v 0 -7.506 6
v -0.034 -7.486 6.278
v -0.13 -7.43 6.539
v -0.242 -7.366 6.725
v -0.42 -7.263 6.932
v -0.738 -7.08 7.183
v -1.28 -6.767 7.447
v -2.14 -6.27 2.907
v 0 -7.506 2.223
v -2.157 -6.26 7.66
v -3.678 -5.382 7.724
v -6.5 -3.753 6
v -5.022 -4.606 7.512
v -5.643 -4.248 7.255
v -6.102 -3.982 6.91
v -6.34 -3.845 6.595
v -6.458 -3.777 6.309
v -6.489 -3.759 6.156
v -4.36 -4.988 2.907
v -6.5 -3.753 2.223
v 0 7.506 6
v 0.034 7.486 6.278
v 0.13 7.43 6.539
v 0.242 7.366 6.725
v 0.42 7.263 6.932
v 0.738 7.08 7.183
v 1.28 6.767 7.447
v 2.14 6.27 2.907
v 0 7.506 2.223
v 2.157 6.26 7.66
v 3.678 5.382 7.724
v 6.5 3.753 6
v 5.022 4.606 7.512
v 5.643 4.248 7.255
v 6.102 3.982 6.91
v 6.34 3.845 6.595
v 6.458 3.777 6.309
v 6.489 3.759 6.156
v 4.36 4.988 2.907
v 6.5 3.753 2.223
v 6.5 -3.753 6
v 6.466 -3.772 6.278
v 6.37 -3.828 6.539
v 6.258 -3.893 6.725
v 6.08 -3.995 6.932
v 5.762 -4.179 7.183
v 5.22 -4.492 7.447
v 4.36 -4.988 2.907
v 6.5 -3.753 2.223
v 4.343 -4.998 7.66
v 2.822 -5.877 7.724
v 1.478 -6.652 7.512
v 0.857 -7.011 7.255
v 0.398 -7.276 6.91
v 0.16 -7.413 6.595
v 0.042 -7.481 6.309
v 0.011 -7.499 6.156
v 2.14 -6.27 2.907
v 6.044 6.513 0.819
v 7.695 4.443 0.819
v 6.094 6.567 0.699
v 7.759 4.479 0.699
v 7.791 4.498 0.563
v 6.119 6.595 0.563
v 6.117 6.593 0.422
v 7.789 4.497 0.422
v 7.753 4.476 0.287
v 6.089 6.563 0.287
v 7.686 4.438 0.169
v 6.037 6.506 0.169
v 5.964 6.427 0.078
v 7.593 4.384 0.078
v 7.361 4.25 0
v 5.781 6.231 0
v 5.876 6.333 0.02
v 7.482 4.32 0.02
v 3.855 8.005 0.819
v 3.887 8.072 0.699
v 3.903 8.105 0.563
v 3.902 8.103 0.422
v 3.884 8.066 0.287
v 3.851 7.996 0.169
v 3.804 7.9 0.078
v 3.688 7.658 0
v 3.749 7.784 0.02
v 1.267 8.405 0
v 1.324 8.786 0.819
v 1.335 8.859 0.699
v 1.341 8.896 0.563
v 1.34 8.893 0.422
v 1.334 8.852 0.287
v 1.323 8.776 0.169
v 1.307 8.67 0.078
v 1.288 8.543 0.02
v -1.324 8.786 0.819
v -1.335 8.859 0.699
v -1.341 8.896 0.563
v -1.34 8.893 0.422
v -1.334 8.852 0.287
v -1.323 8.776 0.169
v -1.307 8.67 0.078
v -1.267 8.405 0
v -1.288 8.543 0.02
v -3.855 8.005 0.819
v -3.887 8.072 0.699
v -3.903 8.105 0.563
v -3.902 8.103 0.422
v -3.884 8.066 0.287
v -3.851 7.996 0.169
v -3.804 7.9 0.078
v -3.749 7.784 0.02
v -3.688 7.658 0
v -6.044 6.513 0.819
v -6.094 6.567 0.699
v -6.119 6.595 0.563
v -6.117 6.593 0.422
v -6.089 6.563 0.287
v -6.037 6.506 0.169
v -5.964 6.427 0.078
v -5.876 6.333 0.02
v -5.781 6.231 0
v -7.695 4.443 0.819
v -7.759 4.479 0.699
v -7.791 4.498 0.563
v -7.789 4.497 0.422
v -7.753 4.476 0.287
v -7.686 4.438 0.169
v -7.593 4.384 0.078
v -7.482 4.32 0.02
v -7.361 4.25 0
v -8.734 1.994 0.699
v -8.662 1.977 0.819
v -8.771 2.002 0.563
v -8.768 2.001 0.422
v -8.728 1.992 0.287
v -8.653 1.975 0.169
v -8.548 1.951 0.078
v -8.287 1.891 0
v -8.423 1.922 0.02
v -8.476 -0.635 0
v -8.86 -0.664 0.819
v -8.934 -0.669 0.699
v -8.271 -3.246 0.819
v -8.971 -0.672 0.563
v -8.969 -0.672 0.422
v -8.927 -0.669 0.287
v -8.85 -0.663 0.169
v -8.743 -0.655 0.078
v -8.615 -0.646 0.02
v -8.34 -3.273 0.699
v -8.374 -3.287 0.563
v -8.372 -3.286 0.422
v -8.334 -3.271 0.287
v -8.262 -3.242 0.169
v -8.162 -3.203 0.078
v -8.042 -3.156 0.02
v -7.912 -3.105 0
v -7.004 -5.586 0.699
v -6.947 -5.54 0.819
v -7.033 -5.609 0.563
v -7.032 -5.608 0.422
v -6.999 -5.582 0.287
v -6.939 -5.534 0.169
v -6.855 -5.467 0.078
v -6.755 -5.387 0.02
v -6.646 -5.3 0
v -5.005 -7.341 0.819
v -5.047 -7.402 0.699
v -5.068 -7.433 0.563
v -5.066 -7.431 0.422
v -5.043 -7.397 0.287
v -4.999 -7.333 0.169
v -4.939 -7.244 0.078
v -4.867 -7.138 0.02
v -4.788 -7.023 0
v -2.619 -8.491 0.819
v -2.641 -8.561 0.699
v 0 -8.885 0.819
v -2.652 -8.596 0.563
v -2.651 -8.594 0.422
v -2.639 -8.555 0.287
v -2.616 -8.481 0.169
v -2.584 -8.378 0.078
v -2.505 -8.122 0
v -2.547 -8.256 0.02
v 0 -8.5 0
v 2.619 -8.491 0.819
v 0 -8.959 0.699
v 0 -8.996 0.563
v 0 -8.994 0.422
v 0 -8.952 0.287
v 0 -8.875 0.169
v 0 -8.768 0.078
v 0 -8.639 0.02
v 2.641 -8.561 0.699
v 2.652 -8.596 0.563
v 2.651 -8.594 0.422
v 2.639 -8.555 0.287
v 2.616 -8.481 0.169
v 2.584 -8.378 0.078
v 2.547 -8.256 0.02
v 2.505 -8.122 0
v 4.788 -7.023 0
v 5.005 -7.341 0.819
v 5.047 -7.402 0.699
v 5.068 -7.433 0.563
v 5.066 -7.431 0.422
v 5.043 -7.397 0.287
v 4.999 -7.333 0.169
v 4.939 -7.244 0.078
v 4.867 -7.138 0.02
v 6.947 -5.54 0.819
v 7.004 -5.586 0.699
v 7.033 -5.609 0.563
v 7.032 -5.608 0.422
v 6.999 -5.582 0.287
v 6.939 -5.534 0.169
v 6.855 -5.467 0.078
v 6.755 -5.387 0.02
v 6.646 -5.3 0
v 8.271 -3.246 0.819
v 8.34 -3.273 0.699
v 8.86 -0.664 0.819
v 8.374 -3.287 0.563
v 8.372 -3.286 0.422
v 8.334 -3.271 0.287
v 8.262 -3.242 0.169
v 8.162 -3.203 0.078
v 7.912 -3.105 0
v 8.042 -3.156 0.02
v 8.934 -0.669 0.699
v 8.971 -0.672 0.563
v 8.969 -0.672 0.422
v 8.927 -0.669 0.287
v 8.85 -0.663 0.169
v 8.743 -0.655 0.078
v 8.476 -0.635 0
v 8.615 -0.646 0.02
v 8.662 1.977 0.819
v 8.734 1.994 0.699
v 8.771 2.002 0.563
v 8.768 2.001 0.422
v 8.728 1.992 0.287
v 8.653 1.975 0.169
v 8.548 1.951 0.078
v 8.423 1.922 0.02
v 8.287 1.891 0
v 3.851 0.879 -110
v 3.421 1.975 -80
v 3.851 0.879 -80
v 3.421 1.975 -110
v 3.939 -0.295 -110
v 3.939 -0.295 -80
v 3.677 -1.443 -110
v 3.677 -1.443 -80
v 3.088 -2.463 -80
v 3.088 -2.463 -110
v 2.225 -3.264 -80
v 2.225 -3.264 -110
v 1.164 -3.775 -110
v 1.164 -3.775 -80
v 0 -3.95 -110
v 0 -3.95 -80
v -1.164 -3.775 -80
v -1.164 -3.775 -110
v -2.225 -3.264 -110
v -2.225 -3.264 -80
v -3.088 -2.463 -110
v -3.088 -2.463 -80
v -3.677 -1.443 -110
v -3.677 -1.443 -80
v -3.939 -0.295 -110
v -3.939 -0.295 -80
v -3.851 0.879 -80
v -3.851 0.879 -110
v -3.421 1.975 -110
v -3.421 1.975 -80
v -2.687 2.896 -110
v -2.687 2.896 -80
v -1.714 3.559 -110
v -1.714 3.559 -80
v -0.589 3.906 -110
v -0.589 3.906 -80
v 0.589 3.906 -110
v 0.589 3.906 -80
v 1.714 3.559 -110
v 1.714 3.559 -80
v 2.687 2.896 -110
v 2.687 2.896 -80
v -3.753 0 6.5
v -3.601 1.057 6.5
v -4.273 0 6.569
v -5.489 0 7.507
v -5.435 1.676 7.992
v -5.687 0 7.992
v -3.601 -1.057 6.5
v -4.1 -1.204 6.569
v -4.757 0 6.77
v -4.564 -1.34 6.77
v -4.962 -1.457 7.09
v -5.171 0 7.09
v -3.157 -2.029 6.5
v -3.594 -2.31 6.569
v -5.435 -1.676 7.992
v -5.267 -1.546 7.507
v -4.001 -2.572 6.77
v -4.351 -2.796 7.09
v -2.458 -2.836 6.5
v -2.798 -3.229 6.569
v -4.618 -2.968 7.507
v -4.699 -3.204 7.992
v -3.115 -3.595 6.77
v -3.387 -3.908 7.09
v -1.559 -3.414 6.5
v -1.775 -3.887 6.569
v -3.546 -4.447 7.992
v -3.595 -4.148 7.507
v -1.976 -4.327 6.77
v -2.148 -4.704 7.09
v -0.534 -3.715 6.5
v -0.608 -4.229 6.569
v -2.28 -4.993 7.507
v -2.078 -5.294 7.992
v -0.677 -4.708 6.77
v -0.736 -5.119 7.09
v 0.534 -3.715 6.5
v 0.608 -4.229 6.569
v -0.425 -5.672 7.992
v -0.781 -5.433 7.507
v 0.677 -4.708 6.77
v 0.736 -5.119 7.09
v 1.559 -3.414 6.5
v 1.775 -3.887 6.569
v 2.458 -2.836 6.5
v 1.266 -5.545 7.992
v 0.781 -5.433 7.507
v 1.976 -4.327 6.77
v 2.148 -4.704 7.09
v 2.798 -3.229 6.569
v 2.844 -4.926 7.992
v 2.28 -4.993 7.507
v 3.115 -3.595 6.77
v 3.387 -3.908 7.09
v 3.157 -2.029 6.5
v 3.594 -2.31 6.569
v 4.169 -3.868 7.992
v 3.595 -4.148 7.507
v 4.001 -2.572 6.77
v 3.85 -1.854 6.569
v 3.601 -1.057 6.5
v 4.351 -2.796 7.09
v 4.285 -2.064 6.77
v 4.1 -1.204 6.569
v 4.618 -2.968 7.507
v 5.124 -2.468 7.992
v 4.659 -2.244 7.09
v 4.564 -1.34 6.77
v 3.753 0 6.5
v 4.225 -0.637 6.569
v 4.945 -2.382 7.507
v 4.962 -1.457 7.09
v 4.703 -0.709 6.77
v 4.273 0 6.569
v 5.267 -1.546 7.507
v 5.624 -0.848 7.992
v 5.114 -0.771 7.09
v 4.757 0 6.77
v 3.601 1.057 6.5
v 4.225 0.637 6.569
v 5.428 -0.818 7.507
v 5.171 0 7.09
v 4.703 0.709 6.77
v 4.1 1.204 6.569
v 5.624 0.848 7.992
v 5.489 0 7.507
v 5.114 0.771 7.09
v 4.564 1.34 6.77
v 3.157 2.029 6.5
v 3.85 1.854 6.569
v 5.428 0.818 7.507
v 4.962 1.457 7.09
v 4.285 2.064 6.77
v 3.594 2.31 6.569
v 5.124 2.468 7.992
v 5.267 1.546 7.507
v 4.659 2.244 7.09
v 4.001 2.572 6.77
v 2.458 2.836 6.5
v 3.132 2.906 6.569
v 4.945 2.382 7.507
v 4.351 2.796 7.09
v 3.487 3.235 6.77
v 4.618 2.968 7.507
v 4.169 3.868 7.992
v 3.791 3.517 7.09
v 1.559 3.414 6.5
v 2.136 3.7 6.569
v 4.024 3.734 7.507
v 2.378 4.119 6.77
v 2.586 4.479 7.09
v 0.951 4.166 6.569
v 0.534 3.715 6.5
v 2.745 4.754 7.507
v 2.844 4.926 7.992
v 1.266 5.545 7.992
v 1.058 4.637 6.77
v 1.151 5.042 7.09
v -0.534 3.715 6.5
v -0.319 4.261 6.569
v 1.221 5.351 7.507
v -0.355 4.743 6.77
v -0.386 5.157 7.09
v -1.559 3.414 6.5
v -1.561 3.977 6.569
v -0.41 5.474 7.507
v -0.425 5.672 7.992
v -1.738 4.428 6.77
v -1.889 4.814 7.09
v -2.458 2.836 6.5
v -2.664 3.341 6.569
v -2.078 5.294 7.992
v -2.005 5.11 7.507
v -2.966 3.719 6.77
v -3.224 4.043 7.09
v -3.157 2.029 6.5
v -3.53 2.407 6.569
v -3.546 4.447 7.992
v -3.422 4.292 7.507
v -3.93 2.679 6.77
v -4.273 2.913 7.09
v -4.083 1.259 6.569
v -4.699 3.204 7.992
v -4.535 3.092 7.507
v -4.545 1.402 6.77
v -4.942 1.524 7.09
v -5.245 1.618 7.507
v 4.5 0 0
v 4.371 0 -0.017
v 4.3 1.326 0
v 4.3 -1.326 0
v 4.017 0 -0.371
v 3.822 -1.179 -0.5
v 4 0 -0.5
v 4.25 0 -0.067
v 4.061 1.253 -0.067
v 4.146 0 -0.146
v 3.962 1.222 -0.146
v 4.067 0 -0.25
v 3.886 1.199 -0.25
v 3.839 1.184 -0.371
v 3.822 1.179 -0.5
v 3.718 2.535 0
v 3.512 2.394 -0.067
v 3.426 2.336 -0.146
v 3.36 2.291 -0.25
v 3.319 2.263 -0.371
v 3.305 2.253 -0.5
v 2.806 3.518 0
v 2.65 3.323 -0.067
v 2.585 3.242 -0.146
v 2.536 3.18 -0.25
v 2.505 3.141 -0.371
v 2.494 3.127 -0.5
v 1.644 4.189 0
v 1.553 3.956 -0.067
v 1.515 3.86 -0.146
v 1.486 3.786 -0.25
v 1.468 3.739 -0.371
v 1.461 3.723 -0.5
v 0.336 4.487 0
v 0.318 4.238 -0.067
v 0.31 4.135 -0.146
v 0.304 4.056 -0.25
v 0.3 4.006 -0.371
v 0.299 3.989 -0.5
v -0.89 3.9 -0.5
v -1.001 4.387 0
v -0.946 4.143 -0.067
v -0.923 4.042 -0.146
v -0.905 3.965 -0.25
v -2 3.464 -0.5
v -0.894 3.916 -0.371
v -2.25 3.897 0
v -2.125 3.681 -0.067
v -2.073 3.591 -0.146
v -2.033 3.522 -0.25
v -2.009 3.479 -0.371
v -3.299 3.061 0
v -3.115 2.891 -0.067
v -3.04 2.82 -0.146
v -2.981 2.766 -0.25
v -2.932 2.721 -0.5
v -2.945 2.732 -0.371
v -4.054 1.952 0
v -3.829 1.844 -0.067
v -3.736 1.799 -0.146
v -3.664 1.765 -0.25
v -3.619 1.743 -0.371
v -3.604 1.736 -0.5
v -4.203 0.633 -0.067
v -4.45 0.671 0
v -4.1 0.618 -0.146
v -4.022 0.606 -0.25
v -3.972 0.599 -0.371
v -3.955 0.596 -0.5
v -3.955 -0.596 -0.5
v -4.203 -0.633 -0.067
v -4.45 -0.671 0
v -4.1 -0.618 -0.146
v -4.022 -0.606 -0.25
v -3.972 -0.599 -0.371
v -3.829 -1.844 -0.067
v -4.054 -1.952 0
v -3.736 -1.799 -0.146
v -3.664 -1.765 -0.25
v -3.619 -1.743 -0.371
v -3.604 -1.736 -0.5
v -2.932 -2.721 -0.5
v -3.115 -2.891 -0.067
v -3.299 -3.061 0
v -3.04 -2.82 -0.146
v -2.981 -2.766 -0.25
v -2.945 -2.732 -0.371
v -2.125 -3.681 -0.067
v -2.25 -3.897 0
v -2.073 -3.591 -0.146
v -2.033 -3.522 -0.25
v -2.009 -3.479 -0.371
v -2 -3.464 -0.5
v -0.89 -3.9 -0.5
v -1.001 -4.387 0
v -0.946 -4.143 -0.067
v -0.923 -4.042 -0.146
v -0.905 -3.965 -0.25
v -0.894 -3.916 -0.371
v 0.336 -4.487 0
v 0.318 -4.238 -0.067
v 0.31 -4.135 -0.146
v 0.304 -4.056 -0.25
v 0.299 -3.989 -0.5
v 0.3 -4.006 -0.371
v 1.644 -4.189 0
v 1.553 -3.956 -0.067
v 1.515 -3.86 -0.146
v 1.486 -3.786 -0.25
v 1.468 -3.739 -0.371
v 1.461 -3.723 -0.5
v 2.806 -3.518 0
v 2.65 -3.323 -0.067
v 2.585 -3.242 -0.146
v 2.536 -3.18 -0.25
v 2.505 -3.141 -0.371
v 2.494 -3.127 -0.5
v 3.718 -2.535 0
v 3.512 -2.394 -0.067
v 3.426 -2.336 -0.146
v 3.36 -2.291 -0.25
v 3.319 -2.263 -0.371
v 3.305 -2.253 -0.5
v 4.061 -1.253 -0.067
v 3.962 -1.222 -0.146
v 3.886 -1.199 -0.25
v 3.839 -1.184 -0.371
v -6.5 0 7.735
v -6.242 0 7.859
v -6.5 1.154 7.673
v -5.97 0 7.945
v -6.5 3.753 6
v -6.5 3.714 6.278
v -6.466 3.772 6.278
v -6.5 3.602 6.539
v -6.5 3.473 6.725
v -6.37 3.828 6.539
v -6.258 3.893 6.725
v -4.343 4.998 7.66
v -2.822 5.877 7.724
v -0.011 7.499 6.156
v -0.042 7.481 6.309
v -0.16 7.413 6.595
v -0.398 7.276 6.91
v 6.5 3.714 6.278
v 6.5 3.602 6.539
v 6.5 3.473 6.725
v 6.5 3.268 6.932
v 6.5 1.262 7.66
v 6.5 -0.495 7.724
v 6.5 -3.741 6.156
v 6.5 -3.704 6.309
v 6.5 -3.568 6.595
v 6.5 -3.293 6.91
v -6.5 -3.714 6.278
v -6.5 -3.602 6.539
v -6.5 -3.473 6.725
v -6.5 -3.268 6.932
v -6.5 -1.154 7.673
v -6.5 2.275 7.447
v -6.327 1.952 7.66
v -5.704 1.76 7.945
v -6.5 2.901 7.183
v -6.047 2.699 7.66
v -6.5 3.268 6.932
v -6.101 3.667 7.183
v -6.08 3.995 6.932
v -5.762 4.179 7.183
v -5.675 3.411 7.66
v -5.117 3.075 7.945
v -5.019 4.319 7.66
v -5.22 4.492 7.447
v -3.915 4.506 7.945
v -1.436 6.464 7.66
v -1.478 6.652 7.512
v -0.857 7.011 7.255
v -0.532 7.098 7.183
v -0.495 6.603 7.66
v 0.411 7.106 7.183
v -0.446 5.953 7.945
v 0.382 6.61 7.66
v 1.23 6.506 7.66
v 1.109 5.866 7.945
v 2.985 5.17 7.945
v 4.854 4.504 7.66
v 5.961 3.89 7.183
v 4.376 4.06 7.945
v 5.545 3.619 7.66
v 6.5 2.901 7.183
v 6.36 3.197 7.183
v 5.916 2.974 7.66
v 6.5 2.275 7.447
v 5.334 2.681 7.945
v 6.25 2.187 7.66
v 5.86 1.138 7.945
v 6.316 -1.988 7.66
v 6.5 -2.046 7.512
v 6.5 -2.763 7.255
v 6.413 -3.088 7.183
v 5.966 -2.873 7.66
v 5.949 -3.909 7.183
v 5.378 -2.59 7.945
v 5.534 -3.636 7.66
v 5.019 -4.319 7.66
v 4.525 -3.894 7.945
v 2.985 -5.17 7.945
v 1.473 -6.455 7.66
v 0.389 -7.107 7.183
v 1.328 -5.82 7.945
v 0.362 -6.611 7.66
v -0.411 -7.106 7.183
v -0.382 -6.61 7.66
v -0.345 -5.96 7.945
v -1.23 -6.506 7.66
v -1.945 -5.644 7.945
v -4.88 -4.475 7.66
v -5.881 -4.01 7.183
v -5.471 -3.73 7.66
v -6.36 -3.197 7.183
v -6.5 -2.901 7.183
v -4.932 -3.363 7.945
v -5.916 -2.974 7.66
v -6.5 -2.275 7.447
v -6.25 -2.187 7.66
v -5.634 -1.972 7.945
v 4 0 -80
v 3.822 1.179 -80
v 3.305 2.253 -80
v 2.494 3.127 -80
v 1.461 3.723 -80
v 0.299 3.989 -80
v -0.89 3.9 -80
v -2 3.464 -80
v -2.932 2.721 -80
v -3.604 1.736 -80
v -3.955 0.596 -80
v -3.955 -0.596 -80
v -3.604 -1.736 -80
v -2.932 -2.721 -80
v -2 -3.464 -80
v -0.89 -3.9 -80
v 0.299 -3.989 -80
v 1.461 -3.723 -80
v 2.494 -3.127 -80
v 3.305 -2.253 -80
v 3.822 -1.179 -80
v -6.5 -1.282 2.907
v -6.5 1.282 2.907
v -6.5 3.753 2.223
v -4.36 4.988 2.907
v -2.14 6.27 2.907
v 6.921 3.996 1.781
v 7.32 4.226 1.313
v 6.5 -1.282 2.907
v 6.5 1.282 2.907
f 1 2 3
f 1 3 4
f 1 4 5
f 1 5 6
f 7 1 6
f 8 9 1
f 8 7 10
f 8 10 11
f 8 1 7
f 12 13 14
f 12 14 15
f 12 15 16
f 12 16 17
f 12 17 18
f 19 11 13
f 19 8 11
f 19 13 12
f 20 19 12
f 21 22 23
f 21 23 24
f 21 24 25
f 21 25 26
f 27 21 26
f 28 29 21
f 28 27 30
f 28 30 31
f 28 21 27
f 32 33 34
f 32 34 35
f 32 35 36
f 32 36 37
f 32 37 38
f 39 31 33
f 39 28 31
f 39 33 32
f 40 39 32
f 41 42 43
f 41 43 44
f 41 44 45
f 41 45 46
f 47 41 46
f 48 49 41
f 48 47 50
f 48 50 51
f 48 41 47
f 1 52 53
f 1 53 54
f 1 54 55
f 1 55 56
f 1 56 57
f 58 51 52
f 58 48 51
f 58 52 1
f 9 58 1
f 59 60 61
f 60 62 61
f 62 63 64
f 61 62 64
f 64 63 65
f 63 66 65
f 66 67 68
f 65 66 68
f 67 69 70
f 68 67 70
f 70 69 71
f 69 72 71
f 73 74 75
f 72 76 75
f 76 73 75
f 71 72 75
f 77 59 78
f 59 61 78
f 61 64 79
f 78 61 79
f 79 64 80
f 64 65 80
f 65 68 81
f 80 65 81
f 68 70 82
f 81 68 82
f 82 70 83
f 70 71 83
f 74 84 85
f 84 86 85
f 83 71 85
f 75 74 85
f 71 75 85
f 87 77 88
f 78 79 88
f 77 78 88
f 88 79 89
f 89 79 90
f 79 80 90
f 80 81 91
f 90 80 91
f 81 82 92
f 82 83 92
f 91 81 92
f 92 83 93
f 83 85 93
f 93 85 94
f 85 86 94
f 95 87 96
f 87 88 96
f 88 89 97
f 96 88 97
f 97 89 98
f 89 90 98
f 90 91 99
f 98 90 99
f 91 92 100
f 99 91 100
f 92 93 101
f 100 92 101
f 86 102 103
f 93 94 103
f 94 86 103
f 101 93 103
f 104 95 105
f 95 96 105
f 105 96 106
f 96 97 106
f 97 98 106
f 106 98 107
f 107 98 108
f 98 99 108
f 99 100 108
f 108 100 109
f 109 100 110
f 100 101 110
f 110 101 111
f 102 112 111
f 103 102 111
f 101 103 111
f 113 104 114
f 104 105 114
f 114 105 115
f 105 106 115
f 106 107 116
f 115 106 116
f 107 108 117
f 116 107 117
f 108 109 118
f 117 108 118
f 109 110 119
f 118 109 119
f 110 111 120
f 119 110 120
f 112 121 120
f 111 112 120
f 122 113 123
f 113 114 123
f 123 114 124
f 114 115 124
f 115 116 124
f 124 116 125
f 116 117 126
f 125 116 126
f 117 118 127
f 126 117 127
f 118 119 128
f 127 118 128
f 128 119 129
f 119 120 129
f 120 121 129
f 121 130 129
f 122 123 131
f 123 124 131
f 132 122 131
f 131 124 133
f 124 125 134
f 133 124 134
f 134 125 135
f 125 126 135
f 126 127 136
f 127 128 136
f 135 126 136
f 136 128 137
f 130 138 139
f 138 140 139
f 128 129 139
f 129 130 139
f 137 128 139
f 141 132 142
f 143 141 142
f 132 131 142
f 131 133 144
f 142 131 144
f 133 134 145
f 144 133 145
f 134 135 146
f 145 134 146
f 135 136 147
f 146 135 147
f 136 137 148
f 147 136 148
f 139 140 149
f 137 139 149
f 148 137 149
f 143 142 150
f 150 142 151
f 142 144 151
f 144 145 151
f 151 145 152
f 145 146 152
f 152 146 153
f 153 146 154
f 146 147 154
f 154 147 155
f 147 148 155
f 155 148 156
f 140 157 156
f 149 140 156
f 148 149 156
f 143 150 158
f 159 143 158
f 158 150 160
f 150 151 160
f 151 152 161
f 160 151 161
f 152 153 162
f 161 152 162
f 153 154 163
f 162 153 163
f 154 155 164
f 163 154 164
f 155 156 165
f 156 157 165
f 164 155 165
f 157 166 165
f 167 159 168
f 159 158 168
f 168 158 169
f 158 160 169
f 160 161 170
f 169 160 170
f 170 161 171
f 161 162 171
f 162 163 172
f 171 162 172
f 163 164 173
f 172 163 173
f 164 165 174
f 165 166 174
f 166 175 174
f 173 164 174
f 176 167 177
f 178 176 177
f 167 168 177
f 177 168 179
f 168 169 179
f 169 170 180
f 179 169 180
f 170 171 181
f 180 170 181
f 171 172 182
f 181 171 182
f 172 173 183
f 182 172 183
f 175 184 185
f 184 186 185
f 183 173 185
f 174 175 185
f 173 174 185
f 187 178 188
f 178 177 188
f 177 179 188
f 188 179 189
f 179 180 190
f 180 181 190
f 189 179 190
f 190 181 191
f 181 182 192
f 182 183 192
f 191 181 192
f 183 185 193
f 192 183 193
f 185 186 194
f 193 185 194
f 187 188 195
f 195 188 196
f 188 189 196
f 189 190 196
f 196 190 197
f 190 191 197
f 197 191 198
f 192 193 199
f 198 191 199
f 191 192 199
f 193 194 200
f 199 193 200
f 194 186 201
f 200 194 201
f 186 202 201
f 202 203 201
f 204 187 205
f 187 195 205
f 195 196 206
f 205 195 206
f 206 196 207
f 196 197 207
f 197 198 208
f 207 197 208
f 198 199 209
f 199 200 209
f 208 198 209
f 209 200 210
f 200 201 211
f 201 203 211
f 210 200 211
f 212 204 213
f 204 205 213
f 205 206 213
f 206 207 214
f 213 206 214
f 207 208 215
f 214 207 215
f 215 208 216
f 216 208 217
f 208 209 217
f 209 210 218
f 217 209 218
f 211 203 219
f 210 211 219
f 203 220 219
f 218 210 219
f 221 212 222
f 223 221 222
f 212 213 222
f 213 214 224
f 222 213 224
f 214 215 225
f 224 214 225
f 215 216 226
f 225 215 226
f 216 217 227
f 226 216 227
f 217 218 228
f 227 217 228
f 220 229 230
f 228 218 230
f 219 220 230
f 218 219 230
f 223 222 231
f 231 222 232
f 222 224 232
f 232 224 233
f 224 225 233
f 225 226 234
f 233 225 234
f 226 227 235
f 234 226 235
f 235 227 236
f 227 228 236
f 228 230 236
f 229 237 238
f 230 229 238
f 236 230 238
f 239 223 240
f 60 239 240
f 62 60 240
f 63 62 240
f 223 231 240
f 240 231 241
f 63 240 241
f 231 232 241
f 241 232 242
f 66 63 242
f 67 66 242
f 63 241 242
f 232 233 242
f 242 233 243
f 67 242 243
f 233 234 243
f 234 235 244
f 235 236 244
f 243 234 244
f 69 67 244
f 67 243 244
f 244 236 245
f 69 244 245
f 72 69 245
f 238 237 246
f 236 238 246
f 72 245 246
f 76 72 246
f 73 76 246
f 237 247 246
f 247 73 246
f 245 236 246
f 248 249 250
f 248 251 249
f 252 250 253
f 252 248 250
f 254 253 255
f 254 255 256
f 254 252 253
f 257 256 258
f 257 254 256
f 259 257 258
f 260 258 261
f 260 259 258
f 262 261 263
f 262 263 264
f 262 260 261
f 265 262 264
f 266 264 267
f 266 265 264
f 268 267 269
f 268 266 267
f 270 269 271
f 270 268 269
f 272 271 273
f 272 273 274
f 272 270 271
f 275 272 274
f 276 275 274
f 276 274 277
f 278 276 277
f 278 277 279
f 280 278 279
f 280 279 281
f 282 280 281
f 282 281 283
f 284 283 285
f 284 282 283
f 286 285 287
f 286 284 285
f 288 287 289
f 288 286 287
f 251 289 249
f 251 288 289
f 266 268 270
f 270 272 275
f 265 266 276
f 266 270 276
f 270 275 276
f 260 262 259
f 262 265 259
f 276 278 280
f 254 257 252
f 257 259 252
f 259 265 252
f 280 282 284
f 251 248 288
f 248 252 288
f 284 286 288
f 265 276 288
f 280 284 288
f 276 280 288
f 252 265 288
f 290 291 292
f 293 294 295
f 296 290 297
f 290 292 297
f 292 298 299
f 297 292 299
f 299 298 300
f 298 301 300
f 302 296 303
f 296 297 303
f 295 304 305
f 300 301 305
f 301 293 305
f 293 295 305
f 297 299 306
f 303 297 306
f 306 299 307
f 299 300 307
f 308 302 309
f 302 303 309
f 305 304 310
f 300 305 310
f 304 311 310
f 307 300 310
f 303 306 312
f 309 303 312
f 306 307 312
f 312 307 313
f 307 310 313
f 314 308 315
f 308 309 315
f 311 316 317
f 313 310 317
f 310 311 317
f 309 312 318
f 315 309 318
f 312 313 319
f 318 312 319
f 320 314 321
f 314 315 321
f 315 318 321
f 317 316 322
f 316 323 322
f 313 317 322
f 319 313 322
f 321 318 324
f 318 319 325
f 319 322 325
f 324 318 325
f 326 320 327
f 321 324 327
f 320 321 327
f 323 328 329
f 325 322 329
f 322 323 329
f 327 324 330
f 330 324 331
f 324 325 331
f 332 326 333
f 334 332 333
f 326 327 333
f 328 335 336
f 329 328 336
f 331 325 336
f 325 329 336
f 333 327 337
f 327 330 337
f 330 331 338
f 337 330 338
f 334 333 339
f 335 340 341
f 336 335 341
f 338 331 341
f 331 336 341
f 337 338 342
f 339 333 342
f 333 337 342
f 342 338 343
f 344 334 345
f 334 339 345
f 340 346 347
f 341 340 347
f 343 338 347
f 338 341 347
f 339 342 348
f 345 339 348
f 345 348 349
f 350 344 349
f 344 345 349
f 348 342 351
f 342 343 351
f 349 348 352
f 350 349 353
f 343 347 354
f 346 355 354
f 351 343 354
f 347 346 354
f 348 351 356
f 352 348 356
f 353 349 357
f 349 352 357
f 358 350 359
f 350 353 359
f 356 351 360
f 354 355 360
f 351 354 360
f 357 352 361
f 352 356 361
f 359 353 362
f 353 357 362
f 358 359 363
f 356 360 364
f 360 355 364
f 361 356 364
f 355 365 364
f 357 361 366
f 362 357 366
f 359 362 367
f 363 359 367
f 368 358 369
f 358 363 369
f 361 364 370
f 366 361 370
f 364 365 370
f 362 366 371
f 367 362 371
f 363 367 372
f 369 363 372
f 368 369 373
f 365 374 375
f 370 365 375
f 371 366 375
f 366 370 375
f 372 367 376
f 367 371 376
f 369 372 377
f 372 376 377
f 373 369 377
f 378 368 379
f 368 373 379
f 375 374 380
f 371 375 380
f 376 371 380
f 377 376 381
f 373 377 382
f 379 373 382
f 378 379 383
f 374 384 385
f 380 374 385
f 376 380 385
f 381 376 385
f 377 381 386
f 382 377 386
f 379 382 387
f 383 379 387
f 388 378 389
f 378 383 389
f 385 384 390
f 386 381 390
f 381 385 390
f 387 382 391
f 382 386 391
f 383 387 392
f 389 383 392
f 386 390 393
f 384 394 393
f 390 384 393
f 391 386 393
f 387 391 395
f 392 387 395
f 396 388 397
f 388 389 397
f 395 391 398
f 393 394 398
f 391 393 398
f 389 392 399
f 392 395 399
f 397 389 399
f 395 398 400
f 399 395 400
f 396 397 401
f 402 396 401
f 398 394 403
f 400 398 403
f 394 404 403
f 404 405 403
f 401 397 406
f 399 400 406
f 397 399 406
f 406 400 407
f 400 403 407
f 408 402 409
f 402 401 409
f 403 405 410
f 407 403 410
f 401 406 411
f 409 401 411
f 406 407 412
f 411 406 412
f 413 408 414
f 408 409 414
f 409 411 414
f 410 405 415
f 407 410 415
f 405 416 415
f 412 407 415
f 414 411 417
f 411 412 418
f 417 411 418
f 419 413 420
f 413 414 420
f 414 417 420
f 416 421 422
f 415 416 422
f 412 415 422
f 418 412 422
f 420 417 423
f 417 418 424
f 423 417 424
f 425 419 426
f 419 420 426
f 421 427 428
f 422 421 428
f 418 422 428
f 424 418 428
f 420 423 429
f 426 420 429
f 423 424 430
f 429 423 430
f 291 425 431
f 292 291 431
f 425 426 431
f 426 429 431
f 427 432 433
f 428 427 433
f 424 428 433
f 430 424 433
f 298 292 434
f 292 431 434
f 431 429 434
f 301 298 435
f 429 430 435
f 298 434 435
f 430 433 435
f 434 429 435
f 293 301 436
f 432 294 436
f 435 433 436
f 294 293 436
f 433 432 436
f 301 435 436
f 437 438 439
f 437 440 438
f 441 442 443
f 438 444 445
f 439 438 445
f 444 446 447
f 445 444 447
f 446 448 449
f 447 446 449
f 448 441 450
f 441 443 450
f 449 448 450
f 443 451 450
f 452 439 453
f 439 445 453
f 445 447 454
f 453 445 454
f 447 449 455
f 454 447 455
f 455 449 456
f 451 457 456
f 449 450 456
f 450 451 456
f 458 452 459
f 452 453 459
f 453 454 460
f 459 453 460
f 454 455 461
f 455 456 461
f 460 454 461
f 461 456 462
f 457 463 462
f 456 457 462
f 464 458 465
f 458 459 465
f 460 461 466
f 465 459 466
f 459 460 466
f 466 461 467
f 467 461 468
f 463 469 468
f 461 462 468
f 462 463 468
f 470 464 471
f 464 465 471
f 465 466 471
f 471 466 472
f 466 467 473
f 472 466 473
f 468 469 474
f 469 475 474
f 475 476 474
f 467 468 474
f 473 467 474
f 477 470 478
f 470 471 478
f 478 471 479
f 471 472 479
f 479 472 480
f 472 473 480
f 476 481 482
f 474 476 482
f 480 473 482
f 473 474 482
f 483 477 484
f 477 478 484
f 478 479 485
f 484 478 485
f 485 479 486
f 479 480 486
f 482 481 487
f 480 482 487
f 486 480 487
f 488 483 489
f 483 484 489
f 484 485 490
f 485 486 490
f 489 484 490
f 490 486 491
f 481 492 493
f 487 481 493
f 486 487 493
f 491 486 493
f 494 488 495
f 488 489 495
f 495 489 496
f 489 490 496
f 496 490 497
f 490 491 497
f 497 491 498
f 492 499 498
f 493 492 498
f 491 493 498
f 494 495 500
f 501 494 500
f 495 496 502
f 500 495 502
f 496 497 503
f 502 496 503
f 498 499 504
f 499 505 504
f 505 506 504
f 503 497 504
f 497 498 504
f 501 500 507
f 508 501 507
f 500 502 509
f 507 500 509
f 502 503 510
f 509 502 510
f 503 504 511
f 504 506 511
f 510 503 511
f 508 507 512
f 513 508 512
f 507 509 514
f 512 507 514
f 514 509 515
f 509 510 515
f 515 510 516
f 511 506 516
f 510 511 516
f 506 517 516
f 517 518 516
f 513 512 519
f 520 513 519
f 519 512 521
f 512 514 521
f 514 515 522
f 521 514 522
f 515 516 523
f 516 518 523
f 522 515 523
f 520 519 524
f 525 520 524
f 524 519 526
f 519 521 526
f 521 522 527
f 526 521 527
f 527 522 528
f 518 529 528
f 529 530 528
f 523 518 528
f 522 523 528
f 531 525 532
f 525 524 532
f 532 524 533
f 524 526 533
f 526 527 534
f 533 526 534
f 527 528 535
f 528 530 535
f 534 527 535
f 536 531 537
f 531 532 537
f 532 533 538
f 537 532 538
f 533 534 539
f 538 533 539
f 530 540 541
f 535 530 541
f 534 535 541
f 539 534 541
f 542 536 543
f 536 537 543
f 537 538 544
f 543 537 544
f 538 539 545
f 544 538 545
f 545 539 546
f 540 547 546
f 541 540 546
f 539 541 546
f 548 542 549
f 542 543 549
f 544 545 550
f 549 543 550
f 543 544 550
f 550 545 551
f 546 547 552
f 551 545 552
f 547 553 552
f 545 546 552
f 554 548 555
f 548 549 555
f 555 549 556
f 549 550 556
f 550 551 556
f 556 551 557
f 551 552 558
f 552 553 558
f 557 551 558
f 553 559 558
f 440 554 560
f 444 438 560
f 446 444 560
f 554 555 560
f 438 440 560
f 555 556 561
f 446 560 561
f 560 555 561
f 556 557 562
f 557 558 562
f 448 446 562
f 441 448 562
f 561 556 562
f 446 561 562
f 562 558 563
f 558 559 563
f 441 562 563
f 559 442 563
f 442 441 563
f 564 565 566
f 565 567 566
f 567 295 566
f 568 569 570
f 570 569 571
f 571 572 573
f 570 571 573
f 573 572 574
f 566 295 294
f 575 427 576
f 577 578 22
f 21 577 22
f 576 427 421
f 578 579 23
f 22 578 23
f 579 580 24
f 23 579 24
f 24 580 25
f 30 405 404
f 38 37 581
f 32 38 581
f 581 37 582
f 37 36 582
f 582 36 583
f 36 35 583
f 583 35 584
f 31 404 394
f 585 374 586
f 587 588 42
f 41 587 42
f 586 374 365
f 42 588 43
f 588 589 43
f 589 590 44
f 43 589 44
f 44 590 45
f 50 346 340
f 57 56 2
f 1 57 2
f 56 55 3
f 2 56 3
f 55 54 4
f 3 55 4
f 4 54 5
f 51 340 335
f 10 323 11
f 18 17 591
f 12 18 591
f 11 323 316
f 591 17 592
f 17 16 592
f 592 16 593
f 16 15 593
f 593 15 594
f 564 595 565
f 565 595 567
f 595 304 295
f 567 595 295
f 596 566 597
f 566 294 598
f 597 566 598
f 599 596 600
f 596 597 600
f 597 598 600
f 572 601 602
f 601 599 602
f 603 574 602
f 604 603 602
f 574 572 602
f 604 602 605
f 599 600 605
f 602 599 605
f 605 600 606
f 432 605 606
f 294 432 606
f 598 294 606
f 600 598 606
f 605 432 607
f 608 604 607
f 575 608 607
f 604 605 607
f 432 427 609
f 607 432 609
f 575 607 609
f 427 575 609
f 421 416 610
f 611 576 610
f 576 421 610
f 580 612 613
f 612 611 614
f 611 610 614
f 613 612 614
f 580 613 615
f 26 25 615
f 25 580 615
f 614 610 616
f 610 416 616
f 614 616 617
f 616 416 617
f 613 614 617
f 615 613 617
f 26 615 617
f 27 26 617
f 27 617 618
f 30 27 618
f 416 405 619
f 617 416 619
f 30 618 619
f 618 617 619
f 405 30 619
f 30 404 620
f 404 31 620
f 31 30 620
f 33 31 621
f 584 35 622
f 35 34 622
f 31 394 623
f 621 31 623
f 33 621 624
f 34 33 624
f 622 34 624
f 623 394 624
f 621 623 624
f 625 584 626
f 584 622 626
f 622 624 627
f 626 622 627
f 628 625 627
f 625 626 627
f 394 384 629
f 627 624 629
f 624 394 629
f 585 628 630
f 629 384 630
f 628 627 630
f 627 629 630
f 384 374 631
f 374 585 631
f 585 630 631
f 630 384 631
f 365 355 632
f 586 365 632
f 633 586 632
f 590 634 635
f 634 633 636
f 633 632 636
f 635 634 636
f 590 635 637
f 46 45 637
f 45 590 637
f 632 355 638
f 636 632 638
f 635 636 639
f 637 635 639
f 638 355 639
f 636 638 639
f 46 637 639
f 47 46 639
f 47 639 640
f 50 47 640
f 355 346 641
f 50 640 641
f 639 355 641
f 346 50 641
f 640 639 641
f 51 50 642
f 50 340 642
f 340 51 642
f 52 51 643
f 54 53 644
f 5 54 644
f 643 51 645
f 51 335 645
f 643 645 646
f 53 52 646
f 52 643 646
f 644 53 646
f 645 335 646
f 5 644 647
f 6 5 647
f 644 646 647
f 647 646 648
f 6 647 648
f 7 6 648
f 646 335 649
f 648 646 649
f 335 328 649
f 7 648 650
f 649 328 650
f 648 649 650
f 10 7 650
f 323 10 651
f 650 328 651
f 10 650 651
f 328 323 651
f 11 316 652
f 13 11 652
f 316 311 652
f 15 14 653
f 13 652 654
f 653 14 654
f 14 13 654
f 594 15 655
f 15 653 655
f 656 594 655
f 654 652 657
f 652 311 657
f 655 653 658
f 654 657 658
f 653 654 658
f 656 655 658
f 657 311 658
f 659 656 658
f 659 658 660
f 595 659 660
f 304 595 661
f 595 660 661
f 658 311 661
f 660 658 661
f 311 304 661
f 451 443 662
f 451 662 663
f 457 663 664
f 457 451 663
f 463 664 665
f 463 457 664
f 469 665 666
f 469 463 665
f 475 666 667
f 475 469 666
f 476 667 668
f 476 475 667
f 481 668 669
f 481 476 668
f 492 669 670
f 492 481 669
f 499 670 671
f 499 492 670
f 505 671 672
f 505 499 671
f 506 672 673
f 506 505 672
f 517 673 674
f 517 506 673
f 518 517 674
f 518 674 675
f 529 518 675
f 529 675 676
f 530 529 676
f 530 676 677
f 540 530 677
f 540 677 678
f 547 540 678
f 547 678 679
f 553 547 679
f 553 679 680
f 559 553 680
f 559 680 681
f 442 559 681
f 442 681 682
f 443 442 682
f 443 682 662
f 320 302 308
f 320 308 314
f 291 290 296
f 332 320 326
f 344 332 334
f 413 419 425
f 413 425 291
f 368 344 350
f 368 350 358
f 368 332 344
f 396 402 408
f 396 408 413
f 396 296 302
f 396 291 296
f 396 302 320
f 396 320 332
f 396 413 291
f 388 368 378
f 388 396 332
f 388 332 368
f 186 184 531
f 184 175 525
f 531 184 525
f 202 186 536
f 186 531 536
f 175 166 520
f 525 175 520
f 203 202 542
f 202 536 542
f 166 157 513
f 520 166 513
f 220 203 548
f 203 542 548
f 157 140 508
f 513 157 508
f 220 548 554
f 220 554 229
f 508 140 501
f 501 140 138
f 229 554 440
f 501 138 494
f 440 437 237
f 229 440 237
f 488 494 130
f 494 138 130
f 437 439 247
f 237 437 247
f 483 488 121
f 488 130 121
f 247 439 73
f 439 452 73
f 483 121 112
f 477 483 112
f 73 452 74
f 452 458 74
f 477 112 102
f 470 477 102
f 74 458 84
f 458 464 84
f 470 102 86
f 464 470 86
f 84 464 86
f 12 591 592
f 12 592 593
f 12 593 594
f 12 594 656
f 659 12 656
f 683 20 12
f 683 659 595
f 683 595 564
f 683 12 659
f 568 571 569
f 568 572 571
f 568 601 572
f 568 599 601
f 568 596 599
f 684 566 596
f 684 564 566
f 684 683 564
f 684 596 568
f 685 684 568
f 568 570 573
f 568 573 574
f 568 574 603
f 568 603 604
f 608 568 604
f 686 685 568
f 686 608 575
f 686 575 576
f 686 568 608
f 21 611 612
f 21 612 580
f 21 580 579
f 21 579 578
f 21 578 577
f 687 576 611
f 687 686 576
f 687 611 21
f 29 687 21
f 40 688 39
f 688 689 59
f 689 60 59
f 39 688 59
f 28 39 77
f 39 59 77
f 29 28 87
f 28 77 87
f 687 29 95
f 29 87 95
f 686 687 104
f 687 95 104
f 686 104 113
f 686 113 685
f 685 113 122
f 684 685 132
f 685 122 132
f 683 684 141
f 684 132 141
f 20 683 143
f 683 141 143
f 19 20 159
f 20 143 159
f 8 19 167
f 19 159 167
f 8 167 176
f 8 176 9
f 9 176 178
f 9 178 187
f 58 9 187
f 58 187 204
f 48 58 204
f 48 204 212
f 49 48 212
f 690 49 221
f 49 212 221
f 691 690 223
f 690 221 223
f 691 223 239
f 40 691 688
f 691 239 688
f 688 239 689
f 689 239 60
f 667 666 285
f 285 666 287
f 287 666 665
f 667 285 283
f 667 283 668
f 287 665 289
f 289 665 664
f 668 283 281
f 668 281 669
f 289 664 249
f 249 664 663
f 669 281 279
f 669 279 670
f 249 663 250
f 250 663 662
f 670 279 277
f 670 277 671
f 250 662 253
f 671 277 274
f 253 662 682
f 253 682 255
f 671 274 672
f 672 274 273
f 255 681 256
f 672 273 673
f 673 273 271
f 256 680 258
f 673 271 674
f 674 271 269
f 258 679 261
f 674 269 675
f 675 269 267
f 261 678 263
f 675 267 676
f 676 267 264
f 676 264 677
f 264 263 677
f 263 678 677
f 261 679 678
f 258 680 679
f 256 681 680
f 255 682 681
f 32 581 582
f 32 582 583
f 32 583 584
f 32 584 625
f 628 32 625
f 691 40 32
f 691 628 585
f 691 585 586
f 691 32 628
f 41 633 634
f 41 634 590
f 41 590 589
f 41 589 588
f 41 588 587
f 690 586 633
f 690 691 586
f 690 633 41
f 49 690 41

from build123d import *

# Parameters (mm, degrees)
HEAD_DEPTH     = 8
SHANK_SKETCH_R = 4
SHANK_DEPTH    = 110
SKETCH6_R      = 5.6875
HEAD_CUT_DEPTH = 1.5
FILLET1_R      = 2
FILLET2_R      = 0.5
THREAD_END_W   = 30
THREAD_END_H   = 0.05


with BuildPart() as part:
    # Head Sketch → Head (new body)
    with BuildSketch(Plane.XY):
        Polygon((0, 7.505553499), (6.5, 3.75277675), (6.5, -3.75277675), (0, -7.505553499), (-6.5, -3.75277675), (-6.5, 3.75277675), align=None)
    extrude(amount=HEAD_DEPTH)

    # Shank Sketch → Shank (add)
    with BuildSketch(Plane.XY):
        Circle(SHANK_SKETCH_R)
    extrude(amount=-SHANK_DEPTH)

    # Sketch3 → Flange (revolve)
    with BuildSketch(Plane(origin=(0, 0, 0), x_dir=(-1, 0, 0), z_dir=(0, 1, 0)), mode=Mode.PRIVATE) as flange_sk:
        with BuildLine():
            Line((-8.5, 0), (0, 0))
            Line((0, 0), (0, 5))
            ThreePointArc((0, 5), (-4.909972075, 3.90244066), (-8.885269122, 0.818696884))
            ThreePointArc((-8.885269122, 0.818696884), (-8.952409351, 0.287101482), (-8.5, 0))
        make_face()
    revolve(flange_sk.sketch.rotate(Axis((0, 0, 0), (0, 0, 1)), 30), axis=Axis((0, 0, 0), (0, 0, 1)))

    # Sketch5 → Head Trim (revolve, cut)
    with BuildSketch(Plane(origin=(0, 0, 0), x_dir=(0, 0, -1), z_dir=(1, 0, 0)), mode=Mode.PRIVATE) as head_trim_sk:
        with BuildLine():
            Line((-8, -5.505553499), (-8, -7.505553499))
            Line((-8, -7.505553499), (-6, -7.505553499))
            ThreePointArc((-6, -7.505553499), (-7.414213562, -6.919767062), (-8, -5.505553499))
        make_face()
    revolve(head_trim_sk.sketch.rotate(Axis((0, 0, 15.085599173), (0, 0, -1)), 90), axis=Axis((0, 0, 15.085599173), (0, 0, -1)), mode=Mode.SUBTRACT)

    # Sketch6 → Head Cut (cut)
    with BuildSketch(Plane.XY.offset(8)):
        Circle(SKETCH6_R)
    extrude(amount=-HEAD_CUT_DEPTH, mode=Mode.SUBTRACT)

    # Fillet1
    # the kernel refuses this fillet: 2 mm, written as the material it adds along each edge
    with BuildSketch(Plane(origin=(0, 0, 6.5), x_dir=(1, 0, 0), z_dir=(0, -1, 0))) as fillet1_piece_1:
        with BuildLine():
            CenterArc((3.753168618, 2), FILLET1_R, 270, 75.276973149)
            Line((3.753168618, 0), (3.753168618, -0.04))
            Line((3.753168618, -0.04), (5.6875, -0.04))
            Line((5.6875, -0.04), (5.7275, 0))
            ThreePointArc((5.7275, 0), (5.7275, 0.745853336), (5.726186628, 1.481540806))
            Line((5.726186628, 1.481540806), (5.6875, 1.491706673))
        make_face()
    revolve(axis=Axis((0, 0, 6.5), (0, 0, 1)), revolution_arc=180.000000894)
    with BuildSketch(Plane(origin=(0, 0, 6.5), x_dir=(-0.9999999999999999, -1.560445893577358e-08, 0), z_dir=(-1.560445893577358e-08, 0.9999999999999999, 0))) as fillet1_piece_2:
        with BuildLine():
            CenterArc((3.753168618, 2), FILLET1_R, 270, 75.276973149)
            Line((3.753168618, 0), (3.753168618, -0.04))
            Line((3.753168618, -0.04), (5.6875, -0.04))
            Line((5.6875, -0.04), (5.7275, 0))
            ThreePointArc((5.7275, 0), (5.7275, 0.745853336), (5.726186628, 1.481540806))
            Line((5.726186628, 1.481540806), (5.6875, 1.491706673))
        make_face()
    revolve(axis=Axis((0, 0, 6.5), (0, 0, 1)), revolution_arc=179.999999106)

    # Fillet2
    fillet2_edges = [part.edges().sort_by_distance(p)[0] for p in [
        (-4, 0, 0),
    ]]
    fillet(fillet2_edges, radius=FILLET2_R)

    # Thread End → Thread Cut (revolve, cut)
    with BuildSketch(Plane(origin=(0, 0, 0), x_dir=(0, 0, -1), z_dir=(1, 0, 0)), mode=Mode.PRIVATE) as thread_cut_sk:
        with Locations((95, 3.975)):
            Rectangle(THREAD_END_W, THREAD_END_H)
    revolve(thread_cut_sk.sketch.rotate(Axis((0, 0, -21.551935625), (0, 0, -1)), 60.000022404), axis=Axis((0, 0, -21.551935625), (0, 0, -1)), mode=Mode.SUBTRACT)


solid = part.part
